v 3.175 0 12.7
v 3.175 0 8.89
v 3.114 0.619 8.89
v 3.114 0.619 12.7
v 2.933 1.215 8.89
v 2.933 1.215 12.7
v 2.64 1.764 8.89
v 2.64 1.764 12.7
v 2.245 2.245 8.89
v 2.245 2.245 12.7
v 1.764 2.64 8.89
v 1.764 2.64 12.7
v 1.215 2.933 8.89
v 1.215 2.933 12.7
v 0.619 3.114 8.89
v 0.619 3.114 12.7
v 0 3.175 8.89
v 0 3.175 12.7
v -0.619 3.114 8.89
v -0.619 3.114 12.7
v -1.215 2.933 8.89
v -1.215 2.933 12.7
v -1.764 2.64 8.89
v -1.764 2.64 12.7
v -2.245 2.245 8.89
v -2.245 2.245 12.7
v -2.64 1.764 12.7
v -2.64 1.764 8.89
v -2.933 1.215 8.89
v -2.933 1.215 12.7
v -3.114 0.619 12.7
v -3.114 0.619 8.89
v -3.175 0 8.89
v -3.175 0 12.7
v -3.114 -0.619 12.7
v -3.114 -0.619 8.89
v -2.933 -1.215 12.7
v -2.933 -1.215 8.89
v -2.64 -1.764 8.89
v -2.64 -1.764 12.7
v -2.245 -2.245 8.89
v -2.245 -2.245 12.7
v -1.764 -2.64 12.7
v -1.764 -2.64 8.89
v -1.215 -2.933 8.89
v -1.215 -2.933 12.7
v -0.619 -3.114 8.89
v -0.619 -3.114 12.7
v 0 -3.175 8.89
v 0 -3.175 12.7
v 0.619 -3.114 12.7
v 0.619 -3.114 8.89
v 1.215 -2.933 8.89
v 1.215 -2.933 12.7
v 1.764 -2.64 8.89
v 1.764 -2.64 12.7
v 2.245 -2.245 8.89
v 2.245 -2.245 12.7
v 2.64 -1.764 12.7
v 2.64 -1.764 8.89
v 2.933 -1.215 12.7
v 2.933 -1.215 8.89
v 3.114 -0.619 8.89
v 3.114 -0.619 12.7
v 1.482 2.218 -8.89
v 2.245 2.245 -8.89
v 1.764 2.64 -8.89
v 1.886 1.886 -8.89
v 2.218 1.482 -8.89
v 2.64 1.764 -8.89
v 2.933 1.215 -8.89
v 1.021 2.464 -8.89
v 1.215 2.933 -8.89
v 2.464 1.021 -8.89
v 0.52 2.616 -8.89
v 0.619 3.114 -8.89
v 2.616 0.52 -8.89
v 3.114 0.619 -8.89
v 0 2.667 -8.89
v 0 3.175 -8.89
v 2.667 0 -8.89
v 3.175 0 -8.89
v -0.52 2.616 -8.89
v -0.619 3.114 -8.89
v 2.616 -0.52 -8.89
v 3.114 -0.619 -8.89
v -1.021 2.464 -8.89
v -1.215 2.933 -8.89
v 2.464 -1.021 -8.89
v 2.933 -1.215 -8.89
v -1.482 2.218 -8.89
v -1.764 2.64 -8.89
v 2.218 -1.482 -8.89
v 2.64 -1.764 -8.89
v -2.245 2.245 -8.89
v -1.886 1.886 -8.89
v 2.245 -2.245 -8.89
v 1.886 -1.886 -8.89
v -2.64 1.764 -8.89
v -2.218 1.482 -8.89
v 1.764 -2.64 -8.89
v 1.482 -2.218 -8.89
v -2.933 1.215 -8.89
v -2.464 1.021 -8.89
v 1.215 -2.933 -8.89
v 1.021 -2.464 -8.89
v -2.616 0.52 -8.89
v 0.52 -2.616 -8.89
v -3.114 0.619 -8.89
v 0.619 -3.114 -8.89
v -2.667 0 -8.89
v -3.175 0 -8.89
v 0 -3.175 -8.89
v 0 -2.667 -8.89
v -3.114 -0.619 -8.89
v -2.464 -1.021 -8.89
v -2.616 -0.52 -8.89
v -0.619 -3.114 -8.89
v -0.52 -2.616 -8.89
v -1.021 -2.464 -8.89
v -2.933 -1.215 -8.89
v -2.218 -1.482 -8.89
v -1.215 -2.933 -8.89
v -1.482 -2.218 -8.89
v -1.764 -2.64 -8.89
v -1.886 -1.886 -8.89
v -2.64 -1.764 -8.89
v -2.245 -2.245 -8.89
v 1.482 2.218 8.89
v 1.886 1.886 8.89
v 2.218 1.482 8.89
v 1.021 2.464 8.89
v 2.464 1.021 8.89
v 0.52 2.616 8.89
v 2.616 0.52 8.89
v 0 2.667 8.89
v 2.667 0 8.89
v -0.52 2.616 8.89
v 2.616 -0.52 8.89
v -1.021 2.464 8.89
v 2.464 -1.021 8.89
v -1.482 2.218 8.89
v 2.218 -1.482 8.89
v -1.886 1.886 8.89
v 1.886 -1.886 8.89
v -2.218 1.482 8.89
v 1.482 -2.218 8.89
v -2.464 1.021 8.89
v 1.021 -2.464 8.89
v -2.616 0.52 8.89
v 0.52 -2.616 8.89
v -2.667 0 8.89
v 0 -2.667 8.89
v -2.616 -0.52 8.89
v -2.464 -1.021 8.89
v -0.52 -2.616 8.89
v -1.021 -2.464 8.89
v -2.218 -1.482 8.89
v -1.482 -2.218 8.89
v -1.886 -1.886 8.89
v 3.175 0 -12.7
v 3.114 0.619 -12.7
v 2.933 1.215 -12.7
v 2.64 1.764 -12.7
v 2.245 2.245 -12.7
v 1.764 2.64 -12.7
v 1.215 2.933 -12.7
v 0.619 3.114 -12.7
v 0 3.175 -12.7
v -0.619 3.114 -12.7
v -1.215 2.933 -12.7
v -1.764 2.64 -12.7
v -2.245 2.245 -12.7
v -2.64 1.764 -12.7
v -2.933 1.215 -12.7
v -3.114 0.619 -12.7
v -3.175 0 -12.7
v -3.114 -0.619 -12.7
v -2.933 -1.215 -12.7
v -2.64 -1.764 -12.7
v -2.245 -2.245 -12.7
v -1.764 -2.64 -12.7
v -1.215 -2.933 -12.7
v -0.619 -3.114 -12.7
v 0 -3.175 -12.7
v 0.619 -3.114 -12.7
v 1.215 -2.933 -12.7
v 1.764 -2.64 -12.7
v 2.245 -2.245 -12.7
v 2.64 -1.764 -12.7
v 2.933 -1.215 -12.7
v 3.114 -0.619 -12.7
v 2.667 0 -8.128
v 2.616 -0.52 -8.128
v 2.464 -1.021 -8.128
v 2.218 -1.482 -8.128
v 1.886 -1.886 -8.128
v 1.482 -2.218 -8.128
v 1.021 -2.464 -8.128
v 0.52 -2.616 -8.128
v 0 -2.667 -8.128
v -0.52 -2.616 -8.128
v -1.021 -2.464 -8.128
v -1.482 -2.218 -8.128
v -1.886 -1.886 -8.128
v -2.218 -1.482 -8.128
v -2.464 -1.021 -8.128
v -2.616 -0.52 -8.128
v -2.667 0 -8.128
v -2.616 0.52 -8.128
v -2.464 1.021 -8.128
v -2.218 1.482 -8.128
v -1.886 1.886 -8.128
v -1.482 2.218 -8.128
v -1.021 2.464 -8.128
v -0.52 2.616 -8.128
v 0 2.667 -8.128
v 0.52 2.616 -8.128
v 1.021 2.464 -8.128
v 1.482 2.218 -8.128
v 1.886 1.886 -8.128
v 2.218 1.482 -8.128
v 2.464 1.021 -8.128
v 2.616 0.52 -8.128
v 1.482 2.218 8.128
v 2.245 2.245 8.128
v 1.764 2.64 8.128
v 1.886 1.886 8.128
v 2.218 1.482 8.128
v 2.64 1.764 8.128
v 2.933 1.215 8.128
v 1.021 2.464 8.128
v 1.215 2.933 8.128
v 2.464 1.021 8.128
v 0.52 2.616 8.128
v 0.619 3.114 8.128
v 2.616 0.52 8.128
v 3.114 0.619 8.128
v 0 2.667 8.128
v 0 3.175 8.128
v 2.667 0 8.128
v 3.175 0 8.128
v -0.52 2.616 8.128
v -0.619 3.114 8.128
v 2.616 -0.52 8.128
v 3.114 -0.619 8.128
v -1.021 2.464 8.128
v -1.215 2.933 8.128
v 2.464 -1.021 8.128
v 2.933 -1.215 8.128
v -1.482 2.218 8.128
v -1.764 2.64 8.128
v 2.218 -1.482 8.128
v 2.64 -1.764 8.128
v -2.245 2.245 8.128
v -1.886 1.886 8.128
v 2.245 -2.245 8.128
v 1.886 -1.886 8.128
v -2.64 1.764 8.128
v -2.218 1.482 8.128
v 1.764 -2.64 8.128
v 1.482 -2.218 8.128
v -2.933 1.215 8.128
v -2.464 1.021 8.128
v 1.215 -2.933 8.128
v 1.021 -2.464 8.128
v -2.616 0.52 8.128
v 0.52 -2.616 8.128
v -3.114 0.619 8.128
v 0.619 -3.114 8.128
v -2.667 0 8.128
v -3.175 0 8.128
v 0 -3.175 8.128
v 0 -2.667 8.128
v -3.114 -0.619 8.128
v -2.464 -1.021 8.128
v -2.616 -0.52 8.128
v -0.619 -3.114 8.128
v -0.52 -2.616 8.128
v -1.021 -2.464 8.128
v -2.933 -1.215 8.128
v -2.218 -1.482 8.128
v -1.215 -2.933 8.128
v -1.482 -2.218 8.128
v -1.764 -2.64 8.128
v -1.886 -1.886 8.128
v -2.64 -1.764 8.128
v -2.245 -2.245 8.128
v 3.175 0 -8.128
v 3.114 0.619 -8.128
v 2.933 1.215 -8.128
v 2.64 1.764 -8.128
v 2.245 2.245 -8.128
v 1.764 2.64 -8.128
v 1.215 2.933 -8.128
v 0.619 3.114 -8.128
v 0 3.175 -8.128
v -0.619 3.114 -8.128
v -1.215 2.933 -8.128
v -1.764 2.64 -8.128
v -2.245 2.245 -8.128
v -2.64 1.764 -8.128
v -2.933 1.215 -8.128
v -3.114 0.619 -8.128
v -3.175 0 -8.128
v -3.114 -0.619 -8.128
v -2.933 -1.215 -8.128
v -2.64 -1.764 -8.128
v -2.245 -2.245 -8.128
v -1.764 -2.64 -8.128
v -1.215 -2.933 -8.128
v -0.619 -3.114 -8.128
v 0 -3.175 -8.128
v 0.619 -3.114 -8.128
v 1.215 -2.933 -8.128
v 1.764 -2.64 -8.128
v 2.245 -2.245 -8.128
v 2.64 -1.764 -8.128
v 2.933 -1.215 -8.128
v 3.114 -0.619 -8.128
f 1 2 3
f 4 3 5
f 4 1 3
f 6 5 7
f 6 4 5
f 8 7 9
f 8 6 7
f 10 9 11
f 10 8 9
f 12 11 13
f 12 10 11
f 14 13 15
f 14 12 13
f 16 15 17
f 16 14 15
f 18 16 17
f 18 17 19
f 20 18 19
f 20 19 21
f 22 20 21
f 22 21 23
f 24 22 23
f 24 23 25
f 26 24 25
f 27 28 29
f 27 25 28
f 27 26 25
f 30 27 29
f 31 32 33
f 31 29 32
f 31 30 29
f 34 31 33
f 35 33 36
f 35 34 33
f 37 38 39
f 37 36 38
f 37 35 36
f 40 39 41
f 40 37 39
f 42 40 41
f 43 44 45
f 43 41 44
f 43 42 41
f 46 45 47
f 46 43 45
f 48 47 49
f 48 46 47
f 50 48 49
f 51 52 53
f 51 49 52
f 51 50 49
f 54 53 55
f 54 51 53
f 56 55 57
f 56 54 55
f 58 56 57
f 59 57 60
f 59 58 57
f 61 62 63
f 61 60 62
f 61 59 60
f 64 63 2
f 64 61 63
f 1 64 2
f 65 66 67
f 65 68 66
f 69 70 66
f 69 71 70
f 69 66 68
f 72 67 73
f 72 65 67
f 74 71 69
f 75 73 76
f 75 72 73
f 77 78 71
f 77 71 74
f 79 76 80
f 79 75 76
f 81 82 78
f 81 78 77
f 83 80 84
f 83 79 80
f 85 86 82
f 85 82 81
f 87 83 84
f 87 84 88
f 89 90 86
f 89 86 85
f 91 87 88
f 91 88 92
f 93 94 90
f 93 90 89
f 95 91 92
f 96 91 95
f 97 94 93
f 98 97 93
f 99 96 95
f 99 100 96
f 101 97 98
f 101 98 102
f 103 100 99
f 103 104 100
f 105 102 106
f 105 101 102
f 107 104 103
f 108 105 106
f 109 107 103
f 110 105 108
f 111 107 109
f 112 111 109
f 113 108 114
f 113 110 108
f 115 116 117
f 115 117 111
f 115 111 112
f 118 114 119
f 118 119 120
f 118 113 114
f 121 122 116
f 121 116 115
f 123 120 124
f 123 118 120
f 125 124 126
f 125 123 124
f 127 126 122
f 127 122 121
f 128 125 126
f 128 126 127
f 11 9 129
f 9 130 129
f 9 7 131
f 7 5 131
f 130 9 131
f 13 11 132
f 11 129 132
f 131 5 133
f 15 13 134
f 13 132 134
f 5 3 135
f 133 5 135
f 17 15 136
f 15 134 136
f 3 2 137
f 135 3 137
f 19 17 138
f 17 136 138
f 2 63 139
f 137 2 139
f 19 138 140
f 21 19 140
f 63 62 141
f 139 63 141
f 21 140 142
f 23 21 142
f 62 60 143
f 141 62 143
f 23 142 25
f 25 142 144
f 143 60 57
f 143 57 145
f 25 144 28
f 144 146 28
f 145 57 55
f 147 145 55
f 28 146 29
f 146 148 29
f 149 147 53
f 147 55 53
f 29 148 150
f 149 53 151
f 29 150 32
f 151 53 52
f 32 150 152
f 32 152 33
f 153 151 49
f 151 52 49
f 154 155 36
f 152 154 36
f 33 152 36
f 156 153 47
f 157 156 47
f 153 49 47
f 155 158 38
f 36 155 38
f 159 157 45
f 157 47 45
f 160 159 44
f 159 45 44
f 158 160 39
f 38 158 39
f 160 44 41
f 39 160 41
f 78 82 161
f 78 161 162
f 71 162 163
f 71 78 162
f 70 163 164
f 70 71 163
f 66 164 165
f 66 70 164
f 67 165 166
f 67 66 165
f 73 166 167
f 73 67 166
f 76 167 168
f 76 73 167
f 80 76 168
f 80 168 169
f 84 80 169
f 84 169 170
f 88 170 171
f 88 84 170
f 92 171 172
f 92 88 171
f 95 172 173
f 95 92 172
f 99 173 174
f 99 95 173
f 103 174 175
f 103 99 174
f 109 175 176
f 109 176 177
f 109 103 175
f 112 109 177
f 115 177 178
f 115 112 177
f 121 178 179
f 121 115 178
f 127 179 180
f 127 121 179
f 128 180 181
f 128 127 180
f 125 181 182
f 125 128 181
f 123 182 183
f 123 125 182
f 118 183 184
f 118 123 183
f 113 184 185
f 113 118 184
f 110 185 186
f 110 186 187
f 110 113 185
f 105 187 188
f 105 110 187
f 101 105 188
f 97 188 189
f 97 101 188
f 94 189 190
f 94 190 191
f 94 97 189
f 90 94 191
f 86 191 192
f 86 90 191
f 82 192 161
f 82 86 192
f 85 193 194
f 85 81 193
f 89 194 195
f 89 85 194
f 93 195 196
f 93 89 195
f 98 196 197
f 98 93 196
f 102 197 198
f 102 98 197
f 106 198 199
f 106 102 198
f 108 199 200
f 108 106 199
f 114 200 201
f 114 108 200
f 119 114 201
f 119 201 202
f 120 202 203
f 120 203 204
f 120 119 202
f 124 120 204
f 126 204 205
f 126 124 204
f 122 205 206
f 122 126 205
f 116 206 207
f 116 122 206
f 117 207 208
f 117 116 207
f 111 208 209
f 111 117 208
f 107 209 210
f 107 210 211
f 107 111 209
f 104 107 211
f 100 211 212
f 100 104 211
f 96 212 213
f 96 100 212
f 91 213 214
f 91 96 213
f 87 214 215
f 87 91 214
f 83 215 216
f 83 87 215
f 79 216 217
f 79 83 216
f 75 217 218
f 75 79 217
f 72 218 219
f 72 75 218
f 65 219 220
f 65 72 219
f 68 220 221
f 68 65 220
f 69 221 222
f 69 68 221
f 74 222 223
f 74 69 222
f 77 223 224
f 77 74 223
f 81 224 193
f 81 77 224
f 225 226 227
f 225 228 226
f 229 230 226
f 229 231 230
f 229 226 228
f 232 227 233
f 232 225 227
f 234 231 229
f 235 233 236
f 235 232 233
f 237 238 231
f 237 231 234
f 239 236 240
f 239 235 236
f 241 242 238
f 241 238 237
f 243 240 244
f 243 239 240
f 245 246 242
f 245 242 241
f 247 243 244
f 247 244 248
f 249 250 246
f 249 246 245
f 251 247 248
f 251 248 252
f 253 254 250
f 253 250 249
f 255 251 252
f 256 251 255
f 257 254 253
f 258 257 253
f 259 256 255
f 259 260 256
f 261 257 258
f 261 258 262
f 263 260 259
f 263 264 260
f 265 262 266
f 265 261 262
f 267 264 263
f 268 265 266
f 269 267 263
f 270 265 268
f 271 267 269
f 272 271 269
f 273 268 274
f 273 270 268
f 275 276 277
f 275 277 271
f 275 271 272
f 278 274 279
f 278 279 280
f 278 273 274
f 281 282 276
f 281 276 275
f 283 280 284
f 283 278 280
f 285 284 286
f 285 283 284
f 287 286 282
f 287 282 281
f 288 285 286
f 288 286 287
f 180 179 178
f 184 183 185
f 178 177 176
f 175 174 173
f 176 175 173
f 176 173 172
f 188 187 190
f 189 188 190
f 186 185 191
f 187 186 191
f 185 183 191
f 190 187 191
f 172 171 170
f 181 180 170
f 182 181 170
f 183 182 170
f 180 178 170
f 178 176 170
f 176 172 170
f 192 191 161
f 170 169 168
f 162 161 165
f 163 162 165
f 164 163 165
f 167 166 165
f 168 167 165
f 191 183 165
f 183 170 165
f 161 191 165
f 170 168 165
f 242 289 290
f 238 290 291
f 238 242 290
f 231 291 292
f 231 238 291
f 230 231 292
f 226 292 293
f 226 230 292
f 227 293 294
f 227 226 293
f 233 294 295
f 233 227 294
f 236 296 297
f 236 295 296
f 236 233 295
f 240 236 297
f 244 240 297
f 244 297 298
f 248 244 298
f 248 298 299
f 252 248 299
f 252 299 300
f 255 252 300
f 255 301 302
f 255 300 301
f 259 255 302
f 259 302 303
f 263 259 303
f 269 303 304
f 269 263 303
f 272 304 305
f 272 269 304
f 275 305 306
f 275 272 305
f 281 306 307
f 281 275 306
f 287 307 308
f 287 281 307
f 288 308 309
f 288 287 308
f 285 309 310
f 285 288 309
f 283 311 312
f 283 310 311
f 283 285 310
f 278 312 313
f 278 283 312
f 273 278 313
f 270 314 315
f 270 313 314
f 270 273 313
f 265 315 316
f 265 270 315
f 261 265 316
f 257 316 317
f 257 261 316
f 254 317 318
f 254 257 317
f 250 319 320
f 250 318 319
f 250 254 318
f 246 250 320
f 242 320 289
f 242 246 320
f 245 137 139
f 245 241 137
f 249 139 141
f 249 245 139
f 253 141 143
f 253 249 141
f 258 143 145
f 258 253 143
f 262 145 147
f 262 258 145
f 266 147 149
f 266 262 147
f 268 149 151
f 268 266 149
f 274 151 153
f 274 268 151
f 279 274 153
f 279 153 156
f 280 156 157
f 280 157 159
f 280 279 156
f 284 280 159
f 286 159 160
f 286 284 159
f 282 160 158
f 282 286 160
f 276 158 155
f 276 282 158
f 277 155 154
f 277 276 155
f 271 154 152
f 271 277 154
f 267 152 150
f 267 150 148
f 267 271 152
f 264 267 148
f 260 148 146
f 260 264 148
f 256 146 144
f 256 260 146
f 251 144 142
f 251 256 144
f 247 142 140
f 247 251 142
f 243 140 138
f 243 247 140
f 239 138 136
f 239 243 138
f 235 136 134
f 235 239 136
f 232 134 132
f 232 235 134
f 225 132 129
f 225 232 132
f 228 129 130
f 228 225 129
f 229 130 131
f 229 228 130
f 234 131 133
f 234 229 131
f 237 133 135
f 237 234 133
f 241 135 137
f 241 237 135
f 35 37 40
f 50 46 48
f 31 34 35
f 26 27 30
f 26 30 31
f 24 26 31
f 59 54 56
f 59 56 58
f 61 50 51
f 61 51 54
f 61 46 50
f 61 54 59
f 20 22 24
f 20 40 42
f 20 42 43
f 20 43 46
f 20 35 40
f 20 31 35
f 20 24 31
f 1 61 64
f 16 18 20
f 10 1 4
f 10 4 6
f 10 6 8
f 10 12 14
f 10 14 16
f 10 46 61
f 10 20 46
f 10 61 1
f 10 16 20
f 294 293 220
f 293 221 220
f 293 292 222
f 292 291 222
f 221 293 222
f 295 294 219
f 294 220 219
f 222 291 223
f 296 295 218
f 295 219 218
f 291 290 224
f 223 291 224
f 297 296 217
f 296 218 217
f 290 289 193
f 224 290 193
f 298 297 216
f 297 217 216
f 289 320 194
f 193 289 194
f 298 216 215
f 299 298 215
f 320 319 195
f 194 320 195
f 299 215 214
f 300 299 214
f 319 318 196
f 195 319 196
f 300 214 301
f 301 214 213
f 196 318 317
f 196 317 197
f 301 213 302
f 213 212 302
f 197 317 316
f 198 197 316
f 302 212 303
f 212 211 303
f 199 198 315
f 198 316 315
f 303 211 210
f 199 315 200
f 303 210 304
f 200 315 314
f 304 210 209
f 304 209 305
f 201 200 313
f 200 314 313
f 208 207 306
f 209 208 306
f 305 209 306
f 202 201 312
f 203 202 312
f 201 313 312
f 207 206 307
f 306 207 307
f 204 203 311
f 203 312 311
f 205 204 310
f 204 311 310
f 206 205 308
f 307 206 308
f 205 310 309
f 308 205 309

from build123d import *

# Parameters (mm, degrees)
SKETCH1_R           = 3.175
BOSS_EXTRUDE1_DEPTH = 12.7
SKETCH2_W           = 0.508
SKETCH2_H           = 0.762


with BuildPart() as part:
    # Sketch1 → Boss-Extrude1 (new body, symmetric)
    with BuildSketch(Plane.XY):
        Circle(SKETCH1_R)
    extrude(amount=BOSS_EXTRUDE1_DEPTH, both=True)

    # Sketch2 → Cut-Revolve1 (revolve, cut)
    with BuildSketch(Plane(origin=(0, 0, 0), x_dir=(1, 0, 0), z_dir=(0, 1, 0))):
        with Locations((2.921, 8.509)):
            Rectangle(SKETCH2_W, SKETCH2_H)
        with Locations((2.921, -8.509)):
            Rectangle(SKETCH2_W, SKETCH2_H)
    revolve(axis=Axis((0, 0, 12.7), (0, 0, -1)), mode=Mode.SUBTRACT)


solid = part.part
